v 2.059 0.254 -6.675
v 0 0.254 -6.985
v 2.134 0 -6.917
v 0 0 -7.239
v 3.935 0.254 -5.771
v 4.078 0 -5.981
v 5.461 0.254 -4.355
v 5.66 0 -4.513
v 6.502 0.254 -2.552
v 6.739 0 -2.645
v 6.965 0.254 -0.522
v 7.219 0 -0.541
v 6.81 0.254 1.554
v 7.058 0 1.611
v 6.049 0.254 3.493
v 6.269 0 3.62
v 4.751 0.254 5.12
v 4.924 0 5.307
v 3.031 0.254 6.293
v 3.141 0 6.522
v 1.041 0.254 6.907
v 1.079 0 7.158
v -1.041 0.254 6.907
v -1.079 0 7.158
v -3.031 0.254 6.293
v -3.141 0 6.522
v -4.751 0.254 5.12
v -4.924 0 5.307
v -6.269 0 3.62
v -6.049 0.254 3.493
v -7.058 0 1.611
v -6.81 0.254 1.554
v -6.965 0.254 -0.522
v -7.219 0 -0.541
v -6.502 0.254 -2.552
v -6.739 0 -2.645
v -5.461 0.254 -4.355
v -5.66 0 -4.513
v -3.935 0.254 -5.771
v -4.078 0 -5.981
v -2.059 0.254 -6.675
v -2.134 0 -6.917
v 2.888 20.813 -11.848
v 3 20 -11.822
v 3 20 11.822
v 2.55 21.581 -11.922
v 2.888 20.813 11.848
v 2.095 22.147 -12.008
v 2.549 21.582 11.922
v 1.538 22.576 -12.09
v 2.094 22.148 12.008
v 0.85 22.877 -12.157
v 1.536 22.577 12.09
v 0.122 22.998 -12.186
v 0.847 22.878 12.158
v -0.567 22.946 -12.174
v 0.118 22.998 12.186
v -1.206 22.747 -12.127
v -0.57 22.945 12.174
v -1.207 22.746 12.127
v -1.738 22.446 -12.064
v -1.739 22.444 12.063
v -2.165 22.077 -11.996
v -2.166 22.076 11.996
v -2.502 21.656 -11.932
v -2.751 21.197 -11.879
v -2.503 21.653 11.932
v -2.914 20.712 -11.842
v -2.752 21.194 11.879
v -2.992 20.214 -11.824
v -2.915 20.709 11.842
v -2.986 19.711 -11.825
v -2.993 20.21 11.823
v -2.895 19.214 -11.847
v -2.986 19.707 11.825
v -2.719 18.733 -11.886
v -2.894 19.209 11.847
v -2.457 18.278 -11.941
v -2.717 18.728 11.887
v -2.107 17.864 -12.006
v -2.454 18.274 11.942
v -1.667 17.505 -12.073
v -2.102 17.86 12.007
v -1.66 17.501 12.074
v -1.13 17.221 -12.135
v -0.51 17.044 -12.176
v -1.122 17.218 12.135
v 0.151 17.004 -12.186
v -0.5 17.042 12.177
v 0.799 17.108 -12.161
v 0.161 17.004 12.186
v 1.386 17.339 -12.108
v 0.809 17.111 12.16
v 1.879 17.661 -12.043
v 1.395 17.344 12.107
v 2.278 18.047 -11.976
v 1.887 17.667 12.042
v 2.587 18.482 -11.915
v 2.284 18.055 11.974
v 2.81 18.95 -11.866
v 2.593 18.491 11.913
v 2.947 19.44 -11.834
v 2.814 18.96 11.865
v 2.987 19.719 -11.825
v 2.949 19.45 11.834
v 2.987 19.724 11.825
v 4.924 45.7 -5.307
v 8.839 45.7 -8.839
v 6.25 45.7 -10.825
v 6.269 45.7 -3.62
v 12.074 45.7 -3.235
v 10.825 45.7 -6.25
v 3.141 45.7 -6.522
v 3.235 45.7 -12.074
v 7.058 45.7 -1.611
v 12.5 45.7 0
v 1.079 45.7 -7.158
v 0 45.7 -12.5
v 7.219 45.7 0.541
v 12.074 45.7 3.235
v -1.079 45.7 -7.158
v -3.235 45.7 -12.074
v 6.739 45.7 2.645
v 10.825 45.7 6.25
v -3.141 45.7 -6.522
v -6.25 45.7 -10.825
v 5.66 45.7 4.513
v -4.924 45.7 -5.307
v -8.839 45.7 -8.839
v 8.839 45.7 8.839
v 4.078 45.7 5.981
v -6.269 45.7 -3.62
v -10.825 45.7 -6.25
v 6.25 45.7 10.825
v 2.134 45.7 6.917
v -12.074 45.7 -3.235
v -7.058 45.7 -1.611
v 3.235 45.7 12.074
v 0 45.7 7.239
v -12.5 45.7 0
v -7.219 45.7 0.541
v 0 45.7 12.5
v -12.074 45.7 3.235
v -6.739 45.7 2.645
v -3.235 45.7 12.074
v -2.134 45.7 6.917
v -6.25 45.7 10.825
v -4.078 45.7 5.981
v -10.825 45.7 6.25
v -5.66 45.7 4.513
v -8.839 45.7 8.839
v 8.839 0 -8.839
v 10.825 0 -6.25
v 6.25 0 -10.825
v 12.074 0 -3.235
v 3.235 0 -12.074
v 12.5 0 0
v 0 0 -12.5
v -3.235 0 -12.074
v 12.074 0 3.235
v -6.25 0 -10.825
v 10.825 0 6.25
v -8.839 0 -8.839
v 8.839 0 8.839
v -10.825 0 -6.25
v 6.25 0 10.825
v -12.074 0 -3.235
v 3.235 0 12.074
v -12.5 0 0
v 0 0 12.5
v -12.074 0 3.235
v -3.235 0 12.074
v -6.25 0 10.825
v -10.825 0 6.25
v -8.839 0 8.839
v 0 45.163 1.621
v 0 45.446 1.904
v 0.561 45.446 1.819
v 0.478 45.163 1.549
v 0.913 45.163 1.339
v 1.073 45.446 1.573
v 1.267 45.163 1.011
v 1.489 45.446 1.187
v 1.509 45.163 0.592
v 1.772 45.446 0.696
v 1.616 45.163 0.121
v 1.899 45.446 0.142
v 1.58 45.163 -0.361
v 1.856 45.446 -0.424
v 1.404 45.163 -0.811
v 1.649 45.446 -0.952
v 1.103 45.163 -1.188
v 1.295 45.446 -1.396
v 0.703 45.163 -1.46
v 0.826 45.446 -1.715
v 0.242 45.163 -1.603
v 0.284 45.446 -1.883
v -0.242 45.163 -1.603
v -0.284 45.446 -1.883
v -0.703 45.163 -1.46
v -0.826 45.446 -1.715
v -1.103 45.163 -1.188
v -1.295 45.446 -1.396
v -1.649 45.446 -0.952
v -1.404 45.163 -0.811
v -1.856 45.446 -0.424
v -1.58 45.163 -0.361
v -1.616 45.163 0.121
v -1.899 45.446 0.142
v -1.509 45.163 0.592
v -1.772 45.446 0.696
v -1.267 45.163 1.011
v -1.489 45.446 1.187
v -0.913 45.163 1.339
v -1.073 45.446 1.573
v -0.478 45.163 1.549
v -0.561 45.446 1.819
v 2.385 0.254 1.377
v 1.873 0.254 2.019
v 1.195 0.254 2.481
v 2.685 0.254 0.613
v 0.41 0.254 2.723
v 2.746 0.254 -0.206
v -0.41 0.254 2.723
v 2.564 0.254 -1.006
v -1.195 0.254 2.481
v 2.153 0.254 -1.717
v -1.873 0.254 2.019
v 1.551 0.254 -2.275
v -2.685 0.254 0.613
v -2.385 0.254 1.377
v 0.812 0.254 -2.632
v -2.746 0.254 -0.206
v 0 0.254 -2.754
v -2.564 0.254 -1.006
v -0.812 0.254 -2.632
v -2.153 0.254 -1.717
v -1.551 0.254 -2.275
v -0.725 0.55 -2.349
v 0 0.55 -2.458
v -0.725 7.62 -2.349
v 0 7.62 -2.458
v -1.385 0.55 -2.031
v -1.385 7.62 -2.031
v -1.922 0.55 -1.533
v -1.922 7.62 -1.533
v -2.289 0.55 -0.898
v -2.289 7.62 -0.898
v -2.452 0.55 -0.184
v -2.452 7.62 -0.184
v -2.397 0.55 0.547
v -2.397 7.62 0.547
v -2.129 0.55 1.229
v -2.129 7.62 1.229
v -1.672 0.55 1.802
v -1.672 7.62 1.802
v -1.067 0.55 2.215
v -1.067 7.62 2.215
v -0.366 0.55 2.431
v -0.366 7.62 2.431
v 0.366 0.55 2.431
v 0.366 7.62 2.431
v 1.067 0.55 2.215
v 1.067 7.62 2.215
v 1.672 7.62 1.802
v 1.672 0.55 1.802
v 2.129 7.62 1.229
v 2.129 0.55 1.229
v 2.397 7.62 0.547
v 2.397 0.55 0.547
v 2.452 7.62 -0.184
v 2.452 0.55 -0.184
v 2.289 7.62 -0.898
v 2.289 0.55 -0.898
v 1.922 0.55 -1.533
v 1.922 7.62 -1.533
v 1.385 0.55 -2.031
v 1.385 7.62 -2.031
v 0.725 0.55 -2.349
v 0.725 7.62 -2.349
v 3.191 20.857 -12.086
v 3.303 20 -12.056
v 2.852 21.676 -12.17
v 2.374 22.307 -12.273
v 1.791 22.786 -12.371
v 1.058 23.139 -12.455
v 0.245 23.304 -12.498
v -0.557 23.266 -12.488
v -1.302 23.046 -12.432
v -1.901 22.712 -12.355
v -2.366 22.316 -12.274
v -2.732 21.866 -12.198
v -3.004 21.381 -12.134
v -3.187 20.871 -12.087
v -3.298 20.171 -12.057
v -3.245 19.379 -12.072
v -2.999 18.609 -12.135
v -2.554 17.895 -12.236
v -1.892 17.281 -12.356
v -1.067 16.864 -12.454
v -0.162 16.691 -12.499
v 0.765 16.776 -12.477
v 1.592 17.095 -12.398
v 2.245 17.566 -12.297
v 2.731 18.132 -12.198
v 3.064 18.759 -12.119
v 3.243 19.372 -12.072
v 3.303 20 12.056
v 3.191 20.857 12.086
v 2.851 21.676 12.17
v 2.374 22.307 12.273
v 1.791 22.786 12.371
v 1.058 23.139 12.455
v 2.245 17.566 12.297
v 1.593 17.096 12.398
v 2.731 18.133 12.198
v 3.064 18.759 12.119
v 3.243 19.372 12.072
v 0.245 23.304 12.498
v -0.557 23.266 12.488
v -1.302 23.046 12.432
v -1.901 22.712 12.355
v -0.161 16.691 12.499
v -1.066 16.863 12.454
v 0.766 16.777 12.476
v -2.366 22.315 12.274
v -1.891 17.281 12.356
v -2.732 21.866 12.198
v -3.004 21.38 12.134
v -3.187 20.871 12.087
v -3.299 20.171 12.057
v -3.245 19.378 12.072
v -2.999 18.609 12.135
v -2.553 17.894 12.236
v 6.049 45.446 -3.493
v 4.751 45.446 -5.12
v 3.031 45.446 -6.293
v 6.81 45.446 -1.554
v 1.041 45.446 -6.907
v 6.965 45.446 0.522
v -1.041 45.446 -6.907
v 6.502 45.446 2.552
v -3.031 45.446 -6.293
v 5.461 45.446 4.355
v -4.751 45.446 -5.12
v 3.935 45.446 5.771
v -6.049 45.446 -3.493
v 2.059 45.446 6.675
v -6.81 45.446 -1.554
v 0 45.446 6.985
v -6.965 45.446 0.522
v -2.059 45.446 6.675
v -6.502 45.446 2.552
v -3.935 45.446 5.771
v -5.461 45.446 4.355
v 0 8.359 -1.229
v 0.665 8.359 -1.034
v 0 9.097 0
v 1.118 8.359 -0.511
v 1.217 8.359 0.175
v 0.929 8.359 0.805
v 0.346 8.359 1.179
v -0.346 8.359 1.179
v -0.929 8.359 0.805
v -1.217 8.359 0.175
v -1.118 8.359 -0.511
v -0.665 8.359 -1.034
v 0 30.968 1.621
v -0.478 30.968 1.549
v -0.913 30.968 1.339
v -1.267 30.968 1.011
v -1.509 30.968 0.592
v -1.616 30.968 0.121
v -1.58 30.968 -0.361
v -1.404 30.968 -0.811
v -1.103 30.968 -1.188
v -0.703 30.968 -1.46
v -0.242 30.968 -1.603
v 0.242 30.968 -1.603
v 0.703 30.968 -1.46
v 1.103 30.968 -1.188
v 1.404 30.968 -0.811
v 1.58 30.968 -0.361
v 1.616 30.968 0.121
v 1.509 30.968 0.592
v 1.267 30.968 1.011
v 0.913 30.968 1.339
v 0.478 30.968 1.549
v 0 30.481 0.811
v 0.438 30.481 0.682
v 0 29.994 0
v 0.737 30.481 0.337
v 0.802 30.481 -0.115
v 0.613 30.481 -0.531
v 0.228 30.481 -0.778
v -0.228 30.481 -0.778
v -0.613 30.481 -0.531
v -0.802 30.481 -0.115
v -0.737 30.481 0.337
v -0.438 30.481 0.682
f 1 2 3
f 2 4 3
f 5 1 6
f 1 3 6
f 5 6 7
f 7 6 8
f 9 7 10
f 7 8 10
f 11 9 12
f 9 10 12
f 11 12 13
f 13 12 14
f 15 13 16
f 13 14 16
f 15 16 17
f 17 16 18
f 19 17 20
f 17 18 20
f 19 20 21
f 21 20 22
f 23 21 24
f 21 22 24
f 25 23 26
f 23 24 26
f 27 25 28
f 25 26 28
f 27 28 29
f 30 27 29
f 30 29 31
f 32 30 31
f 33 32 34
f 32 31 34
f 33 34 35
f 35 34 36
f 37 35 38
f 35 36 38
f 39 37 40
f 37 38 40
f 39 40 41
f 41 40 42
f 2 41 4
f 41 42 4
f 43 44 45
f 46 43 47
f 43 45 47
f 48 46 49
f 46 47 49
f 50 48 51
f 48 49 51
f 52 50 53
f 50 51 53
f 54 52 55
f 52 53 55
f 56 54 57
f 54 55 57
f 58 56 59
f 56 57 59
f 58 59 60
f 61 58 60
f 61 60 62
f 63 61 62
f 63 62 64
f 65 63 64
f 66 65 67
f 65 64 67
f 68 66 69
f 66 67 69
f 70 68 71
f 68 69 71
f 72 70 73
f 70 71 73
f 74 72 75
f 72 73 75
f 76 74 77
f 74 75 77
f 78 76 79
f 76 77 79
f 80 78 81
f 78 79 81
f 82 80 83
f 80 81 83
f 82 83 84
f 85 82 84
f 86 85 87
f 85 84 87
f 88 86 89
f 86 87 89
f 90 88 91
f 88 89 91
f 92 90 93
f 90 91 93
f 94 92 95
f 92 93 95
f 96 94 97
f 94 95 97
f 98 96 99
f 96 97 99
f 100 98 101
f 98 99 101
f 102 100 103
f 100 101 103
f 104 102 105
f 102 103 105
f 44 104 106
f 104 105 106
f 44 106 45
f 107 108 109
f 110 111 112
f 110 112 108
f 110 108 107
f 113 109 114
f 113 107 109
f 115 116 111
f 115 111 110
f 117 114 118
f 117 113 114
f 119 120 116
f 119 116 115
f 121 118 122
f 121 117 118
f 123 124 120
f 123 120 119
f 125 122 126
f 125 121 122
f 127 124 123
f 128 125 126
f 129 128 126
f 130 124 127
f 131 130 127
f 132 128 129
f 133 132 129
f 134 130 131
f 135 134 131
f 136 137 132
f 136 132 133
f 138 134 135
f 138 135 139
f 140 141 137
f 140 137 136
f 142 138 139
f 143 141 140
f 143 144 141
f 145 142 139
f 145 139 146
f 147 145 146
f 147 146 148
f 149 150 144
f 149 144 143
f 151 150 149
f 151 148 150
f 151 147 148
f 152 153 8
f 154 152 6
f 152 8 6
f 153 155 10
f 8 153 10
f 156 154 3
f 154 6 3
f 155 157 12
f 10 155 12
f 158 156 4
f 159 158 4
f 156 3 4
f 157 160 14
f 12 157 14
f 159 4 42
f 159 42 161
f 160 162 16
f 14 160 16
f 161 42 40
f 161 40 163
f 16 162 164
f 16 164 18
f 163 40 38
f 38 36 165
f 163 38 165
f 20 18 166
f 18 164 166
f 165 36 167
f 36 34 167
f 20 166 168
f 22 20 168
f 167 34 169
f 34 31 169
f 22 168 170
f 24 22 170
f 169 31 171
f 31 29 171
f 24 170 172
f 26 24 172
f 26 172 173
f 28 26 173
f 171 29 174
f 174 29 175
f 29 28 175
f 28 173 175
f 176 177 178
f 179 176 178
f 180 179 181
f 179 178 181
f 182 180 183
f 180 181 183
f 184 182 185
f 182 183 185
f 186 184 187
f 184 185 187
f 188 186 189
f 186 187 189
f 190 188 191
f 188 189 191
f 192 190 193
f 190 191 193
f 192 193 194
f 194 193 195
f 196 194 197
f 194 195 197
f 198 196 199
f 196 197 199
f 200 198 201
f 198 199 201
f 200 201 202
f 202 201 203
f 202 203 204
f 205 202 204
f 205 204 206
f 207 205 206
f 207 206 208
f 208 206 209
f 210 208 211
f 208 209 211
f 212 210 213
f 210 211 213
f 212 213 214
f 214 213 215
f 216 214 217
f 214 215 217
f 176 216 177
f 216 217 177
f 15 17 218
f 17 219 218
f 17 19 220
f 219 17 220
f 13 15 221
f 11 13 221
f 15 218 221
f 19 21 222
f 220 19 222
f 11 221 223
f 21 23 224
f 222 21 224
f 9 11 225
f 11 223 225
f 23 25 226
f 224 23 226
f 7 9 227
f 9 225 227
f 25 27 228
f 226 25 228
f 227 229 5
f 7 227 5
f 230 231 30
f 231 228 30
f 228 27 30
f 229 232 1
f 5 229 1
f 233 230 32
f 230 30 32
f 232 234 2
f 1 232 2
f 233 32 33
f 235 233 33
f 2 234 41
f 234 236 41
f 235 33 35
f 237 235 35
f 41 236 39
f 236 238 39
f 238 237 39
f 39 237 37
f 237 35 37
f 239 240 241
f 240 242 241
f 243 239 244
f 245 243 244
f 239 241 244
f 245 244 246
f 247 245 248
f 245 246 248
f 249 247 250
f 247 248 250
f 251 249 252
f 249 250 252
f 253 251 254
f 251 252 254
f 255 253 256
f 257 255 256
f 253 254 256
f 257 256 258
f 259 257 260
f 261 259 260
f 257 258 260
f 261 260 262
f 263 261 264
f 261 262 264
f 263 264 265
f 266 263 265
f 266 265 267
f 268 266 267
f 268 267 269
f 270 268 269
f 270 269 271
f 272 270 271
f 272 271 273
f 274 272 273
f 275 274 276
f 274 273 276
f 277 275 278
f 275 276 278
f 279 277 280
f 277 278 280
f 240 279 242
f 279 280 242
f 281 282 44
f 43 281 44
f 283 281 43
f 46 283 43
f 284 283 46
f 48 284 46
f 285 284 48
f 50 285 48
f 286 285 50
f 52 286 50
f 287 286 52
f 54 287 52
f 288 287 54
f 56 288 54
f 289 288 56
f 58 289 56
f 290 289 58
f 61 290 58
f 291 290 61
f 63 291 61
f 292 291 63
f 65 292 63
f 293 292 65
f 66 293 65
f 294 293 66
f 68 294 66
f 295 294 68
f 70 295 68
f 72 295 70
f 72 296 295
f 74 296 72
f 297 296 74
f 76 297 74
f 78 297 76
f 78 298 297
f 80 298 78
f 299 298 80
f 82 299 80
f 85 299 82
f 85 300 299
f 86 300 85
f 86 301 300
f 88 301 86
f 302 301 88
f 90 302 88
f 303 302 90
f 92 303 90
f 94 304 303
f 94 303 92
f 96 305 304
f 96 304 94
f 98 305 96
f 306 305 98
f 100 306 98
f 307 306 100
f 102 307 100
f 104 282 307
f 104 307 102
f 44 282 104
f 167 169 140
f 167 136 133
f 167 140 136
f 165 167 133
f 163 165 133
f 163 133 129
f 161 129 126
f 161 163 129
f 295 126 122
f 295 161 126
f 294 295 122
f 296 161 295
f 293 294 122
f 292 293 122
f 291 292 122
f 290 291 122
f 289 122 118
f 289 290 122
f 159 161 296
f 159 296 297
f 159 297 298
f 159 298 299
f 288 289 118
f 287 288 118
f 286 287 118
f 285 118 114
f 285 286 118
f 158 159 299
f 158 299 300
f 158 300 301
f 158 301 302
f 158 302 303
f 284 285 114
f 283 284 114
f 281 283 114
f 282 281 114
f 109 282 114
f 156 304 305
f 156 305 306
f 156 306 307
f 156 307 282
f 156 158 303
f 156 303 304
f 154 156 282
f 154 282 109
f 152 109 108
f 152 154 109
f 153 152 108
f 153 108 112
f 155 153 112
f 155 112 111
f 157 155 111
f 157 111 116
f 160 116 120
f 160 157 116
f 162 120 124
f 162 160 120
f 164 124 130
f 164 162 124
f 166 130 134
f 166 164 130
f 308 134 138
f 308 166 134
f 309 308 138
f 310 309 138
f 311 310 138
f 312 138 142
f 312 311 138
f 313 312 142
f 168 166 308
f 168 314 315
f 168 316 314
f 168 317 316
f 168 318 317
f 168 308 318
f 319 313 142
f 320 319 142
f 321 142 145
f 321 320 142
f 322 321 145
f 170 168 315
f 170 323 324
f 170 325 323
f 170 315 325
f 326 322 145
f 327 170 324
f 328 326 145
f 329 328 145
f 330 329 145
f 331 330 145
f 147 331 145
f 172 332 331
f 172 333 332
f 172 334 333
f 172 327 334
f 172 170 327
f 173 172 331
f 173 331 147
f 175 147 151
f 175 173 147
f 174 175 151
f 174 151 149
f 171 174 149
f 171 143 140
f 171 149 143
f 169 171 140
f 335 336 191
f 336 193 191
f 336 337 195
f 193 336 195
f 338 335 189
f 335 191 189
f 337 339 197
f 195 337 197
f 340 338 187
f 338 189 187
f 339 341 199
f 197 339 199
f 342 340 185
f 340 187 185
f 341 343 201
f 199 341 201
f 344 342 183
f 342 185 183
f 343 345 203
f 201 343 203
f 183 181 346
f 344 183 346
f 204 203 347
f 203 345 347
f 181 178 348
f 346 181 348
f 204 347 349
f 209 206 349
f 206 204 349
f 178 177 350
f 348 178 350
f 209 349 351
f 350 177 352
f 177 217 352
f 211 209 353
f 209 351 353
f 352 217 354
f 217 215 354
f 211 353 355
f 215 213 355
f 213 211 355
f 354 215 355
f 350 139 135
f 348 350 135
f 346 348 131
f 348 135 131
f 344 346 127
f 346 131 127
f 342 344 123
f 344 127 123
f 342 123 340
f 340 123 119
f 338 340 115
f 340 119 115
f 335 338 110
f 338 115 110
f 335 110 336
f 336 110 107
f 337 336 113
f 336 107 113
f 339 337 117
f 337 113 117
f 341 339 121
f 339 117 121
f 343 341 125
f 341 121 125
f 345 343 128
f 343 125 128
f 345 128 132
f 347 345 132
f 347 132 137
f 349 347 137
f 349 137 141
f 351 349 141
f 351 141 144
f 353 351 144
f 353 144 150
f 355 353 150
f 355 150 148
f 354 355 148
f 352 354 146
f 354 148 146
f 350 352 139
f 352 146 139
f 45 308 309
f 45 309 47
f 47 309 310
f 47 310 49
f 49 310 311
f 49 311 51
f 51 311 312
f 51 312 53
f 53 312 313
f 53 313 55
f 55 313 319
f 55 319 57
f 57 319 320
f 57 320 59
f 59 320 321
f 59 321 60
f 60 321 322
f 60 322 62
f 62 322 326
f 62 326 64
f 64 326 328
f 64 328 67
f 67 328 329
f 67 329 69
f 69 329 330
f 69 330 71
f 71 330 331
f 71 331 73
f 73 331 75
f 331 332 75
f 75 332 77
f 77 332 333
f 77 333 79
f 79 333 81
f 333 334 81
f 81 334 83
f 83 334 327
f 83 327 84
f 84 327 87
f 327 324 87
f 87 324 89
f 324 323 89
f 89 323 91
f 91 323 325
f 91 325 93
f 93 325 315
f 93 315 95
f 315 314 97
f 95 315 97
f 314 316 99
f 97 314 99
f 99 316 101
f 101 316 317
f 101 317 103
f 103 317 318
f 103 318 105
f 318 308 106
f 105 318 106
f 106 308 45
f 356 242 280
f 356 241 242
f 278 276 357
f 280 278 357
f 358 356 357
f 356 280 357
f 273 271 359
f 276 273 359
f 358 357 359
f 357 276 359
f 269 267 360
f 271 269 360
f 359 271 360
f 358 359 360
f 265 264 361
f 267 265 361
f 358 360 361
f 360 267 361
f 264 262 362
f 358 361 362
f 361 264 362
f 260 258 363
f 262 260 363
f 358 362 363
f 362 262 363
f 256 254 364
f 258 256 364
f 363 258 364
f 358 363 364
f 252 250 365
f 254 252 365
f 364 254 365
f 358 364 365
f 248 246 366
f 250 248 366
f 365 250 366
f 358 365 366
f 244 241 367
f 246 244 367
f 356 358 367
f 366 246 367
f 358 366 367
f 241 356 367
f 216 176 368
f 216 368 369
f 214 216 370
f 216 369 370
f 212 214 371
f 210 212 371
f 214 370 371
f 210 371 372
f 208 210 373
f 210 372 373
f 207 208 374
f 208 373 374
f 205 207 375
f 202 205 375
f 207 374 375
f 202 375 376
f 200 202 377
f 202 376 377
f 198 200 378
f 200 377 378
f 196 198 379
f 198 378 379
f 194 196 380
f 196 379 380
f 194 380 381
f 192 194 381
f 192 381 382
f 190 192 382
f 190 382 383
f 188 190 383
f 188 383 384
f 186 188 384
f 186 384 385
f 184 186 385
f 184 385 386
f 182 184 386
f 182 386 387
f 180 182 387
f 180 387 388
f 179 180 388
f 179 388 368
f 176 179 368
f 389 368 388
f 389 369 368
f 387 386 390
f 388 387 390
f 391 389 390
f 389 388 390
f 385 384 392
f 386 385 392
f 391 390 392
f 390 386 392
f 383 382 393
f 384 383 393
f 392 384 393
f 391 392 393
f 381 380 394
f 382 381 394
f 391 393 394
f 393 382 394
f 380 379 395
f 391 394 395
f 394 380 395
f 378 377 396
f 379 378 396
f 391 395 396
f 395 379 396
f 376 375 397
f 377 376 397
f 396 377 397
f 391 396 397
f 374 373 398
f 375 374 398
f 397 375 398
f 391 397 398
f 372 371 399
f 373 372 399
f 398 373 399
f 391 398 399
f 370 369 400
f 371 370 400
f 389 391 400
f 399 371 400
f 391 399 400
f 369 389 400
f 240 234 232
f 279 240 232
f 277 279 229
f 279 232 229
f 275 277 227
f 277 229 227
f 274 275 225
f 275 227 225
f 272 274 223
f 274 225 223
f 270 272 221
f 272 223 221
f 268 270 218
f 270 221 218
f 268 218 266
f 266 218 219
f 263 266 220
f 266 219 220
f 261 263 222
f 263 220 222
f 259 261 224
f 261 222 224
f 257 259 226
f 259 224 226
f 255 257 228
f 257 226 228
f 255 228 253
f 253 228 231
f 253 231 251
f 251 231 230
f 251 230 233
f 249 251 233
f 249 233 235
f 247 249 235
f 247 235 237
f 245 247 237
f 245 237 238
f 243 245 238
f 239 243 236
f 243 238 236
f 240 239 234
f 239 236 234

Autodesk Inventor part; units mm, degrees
ref_plane "YZ Plane" through (0, 0, 0) normal (1, 0, 0) x (0, 1, 0)
ref_plane "XZ Plane" through (0, 0, 0) normal (0, 1, 0) x (-1, 0, 0)
ref_plane "XY Plane" through (0, 0, 0) normal (0, 0, 1) x (1, 0, 0)
sketch "Sketch1" plane through (0, 0, 0) normal (0, 1, 0) x (-1, 0, 0)
  circle A0 centre (0, 0) radius 12.5
  dimension "d0" = 25
extrude "Extrusion1" add sketch "Sketch1" along normal blind 45.7
hole "ReliefTop" at (0, 45.7, 0) direction (0, -1, 0) diameter 13.97 depth 0.254 countersink diameter 14.478 countersink angle 90
hole "ReliefBottom" at (0, 0, 0) direction (0, 1, 0) diameter 13.97 depth 0.254 countersink diameter 14.478 countersink angle 90
hole "MountBottomM6" at (0, 0.254, 0) direction (0, 1, 0) diameter 4.917 depth 7.366 tip angle 118 countersink diameter 5.508 countersink angle 90 thread size "M6x1" class "6H" standard "ISO Metric profile"
hole "MountTopM4" at (0, 45.446, 0) direction (0, -1, 0) diameter 3.242 depth 14.478 tip angle 118 countersink diameter 3.808 countersink angle 90 thread size "M4x0.7" class "6H" standard "ISO Metric profile"
sketch "Sketch2" plane through (0, 0, 0) normal (0, 0, 1) x (1, 0, 0)
  circle A0 centre (0, 20) radius 3
  line L0 (-12.5, 0) -> (12.5, 0) projected
  line L1 (0, -4.6) -> (0, 27.6) projected
  point P0 (0, 0)
  dimension "d49" = 6
  dimension "d50" = 20
extrude "Extrusion2" cut sketch "Sketch2" along normal through all both and the other way through all
chamfer "Chamfer1" distance 0.313 angle 45 2 edges at (-3, 19.9998, 12.1347) (-3, 19.9998, -12.1347)
equation "\"d1\" = height"
equation "\"d5\" = reliefMinor"
equation "\"d7\" = reliefMajor"
equation "\"d10\" = reliefDepth"
equation "\"d14\" = reliefMinor"
equation "\"d16\" = reliefMajor"
equation "\"d19\" = reliefDepth"
equation "\"d25\" = chamferM6"
equation "\"d28\" = depthM6"
equation "\"d40\" = chamferM4"
equation "\"d43\" = depthM4"
equation "\"reliefDepth\" = 0.254"
equation "\"reliefMinor\" = 13.97"
equation "\"reliefMajor\" = 14.478"
equation "\"chamferM6\" = 5.508"
equation "\"chamferM4\" = 3.808"
equation "\"depthM6\" = 7.366"
equation "\"depthM4\" = 14.478"
equation "\"height\" = 45.7"
properties part number "PLS-P642H0457A00_M" material "Stainless Steel"
